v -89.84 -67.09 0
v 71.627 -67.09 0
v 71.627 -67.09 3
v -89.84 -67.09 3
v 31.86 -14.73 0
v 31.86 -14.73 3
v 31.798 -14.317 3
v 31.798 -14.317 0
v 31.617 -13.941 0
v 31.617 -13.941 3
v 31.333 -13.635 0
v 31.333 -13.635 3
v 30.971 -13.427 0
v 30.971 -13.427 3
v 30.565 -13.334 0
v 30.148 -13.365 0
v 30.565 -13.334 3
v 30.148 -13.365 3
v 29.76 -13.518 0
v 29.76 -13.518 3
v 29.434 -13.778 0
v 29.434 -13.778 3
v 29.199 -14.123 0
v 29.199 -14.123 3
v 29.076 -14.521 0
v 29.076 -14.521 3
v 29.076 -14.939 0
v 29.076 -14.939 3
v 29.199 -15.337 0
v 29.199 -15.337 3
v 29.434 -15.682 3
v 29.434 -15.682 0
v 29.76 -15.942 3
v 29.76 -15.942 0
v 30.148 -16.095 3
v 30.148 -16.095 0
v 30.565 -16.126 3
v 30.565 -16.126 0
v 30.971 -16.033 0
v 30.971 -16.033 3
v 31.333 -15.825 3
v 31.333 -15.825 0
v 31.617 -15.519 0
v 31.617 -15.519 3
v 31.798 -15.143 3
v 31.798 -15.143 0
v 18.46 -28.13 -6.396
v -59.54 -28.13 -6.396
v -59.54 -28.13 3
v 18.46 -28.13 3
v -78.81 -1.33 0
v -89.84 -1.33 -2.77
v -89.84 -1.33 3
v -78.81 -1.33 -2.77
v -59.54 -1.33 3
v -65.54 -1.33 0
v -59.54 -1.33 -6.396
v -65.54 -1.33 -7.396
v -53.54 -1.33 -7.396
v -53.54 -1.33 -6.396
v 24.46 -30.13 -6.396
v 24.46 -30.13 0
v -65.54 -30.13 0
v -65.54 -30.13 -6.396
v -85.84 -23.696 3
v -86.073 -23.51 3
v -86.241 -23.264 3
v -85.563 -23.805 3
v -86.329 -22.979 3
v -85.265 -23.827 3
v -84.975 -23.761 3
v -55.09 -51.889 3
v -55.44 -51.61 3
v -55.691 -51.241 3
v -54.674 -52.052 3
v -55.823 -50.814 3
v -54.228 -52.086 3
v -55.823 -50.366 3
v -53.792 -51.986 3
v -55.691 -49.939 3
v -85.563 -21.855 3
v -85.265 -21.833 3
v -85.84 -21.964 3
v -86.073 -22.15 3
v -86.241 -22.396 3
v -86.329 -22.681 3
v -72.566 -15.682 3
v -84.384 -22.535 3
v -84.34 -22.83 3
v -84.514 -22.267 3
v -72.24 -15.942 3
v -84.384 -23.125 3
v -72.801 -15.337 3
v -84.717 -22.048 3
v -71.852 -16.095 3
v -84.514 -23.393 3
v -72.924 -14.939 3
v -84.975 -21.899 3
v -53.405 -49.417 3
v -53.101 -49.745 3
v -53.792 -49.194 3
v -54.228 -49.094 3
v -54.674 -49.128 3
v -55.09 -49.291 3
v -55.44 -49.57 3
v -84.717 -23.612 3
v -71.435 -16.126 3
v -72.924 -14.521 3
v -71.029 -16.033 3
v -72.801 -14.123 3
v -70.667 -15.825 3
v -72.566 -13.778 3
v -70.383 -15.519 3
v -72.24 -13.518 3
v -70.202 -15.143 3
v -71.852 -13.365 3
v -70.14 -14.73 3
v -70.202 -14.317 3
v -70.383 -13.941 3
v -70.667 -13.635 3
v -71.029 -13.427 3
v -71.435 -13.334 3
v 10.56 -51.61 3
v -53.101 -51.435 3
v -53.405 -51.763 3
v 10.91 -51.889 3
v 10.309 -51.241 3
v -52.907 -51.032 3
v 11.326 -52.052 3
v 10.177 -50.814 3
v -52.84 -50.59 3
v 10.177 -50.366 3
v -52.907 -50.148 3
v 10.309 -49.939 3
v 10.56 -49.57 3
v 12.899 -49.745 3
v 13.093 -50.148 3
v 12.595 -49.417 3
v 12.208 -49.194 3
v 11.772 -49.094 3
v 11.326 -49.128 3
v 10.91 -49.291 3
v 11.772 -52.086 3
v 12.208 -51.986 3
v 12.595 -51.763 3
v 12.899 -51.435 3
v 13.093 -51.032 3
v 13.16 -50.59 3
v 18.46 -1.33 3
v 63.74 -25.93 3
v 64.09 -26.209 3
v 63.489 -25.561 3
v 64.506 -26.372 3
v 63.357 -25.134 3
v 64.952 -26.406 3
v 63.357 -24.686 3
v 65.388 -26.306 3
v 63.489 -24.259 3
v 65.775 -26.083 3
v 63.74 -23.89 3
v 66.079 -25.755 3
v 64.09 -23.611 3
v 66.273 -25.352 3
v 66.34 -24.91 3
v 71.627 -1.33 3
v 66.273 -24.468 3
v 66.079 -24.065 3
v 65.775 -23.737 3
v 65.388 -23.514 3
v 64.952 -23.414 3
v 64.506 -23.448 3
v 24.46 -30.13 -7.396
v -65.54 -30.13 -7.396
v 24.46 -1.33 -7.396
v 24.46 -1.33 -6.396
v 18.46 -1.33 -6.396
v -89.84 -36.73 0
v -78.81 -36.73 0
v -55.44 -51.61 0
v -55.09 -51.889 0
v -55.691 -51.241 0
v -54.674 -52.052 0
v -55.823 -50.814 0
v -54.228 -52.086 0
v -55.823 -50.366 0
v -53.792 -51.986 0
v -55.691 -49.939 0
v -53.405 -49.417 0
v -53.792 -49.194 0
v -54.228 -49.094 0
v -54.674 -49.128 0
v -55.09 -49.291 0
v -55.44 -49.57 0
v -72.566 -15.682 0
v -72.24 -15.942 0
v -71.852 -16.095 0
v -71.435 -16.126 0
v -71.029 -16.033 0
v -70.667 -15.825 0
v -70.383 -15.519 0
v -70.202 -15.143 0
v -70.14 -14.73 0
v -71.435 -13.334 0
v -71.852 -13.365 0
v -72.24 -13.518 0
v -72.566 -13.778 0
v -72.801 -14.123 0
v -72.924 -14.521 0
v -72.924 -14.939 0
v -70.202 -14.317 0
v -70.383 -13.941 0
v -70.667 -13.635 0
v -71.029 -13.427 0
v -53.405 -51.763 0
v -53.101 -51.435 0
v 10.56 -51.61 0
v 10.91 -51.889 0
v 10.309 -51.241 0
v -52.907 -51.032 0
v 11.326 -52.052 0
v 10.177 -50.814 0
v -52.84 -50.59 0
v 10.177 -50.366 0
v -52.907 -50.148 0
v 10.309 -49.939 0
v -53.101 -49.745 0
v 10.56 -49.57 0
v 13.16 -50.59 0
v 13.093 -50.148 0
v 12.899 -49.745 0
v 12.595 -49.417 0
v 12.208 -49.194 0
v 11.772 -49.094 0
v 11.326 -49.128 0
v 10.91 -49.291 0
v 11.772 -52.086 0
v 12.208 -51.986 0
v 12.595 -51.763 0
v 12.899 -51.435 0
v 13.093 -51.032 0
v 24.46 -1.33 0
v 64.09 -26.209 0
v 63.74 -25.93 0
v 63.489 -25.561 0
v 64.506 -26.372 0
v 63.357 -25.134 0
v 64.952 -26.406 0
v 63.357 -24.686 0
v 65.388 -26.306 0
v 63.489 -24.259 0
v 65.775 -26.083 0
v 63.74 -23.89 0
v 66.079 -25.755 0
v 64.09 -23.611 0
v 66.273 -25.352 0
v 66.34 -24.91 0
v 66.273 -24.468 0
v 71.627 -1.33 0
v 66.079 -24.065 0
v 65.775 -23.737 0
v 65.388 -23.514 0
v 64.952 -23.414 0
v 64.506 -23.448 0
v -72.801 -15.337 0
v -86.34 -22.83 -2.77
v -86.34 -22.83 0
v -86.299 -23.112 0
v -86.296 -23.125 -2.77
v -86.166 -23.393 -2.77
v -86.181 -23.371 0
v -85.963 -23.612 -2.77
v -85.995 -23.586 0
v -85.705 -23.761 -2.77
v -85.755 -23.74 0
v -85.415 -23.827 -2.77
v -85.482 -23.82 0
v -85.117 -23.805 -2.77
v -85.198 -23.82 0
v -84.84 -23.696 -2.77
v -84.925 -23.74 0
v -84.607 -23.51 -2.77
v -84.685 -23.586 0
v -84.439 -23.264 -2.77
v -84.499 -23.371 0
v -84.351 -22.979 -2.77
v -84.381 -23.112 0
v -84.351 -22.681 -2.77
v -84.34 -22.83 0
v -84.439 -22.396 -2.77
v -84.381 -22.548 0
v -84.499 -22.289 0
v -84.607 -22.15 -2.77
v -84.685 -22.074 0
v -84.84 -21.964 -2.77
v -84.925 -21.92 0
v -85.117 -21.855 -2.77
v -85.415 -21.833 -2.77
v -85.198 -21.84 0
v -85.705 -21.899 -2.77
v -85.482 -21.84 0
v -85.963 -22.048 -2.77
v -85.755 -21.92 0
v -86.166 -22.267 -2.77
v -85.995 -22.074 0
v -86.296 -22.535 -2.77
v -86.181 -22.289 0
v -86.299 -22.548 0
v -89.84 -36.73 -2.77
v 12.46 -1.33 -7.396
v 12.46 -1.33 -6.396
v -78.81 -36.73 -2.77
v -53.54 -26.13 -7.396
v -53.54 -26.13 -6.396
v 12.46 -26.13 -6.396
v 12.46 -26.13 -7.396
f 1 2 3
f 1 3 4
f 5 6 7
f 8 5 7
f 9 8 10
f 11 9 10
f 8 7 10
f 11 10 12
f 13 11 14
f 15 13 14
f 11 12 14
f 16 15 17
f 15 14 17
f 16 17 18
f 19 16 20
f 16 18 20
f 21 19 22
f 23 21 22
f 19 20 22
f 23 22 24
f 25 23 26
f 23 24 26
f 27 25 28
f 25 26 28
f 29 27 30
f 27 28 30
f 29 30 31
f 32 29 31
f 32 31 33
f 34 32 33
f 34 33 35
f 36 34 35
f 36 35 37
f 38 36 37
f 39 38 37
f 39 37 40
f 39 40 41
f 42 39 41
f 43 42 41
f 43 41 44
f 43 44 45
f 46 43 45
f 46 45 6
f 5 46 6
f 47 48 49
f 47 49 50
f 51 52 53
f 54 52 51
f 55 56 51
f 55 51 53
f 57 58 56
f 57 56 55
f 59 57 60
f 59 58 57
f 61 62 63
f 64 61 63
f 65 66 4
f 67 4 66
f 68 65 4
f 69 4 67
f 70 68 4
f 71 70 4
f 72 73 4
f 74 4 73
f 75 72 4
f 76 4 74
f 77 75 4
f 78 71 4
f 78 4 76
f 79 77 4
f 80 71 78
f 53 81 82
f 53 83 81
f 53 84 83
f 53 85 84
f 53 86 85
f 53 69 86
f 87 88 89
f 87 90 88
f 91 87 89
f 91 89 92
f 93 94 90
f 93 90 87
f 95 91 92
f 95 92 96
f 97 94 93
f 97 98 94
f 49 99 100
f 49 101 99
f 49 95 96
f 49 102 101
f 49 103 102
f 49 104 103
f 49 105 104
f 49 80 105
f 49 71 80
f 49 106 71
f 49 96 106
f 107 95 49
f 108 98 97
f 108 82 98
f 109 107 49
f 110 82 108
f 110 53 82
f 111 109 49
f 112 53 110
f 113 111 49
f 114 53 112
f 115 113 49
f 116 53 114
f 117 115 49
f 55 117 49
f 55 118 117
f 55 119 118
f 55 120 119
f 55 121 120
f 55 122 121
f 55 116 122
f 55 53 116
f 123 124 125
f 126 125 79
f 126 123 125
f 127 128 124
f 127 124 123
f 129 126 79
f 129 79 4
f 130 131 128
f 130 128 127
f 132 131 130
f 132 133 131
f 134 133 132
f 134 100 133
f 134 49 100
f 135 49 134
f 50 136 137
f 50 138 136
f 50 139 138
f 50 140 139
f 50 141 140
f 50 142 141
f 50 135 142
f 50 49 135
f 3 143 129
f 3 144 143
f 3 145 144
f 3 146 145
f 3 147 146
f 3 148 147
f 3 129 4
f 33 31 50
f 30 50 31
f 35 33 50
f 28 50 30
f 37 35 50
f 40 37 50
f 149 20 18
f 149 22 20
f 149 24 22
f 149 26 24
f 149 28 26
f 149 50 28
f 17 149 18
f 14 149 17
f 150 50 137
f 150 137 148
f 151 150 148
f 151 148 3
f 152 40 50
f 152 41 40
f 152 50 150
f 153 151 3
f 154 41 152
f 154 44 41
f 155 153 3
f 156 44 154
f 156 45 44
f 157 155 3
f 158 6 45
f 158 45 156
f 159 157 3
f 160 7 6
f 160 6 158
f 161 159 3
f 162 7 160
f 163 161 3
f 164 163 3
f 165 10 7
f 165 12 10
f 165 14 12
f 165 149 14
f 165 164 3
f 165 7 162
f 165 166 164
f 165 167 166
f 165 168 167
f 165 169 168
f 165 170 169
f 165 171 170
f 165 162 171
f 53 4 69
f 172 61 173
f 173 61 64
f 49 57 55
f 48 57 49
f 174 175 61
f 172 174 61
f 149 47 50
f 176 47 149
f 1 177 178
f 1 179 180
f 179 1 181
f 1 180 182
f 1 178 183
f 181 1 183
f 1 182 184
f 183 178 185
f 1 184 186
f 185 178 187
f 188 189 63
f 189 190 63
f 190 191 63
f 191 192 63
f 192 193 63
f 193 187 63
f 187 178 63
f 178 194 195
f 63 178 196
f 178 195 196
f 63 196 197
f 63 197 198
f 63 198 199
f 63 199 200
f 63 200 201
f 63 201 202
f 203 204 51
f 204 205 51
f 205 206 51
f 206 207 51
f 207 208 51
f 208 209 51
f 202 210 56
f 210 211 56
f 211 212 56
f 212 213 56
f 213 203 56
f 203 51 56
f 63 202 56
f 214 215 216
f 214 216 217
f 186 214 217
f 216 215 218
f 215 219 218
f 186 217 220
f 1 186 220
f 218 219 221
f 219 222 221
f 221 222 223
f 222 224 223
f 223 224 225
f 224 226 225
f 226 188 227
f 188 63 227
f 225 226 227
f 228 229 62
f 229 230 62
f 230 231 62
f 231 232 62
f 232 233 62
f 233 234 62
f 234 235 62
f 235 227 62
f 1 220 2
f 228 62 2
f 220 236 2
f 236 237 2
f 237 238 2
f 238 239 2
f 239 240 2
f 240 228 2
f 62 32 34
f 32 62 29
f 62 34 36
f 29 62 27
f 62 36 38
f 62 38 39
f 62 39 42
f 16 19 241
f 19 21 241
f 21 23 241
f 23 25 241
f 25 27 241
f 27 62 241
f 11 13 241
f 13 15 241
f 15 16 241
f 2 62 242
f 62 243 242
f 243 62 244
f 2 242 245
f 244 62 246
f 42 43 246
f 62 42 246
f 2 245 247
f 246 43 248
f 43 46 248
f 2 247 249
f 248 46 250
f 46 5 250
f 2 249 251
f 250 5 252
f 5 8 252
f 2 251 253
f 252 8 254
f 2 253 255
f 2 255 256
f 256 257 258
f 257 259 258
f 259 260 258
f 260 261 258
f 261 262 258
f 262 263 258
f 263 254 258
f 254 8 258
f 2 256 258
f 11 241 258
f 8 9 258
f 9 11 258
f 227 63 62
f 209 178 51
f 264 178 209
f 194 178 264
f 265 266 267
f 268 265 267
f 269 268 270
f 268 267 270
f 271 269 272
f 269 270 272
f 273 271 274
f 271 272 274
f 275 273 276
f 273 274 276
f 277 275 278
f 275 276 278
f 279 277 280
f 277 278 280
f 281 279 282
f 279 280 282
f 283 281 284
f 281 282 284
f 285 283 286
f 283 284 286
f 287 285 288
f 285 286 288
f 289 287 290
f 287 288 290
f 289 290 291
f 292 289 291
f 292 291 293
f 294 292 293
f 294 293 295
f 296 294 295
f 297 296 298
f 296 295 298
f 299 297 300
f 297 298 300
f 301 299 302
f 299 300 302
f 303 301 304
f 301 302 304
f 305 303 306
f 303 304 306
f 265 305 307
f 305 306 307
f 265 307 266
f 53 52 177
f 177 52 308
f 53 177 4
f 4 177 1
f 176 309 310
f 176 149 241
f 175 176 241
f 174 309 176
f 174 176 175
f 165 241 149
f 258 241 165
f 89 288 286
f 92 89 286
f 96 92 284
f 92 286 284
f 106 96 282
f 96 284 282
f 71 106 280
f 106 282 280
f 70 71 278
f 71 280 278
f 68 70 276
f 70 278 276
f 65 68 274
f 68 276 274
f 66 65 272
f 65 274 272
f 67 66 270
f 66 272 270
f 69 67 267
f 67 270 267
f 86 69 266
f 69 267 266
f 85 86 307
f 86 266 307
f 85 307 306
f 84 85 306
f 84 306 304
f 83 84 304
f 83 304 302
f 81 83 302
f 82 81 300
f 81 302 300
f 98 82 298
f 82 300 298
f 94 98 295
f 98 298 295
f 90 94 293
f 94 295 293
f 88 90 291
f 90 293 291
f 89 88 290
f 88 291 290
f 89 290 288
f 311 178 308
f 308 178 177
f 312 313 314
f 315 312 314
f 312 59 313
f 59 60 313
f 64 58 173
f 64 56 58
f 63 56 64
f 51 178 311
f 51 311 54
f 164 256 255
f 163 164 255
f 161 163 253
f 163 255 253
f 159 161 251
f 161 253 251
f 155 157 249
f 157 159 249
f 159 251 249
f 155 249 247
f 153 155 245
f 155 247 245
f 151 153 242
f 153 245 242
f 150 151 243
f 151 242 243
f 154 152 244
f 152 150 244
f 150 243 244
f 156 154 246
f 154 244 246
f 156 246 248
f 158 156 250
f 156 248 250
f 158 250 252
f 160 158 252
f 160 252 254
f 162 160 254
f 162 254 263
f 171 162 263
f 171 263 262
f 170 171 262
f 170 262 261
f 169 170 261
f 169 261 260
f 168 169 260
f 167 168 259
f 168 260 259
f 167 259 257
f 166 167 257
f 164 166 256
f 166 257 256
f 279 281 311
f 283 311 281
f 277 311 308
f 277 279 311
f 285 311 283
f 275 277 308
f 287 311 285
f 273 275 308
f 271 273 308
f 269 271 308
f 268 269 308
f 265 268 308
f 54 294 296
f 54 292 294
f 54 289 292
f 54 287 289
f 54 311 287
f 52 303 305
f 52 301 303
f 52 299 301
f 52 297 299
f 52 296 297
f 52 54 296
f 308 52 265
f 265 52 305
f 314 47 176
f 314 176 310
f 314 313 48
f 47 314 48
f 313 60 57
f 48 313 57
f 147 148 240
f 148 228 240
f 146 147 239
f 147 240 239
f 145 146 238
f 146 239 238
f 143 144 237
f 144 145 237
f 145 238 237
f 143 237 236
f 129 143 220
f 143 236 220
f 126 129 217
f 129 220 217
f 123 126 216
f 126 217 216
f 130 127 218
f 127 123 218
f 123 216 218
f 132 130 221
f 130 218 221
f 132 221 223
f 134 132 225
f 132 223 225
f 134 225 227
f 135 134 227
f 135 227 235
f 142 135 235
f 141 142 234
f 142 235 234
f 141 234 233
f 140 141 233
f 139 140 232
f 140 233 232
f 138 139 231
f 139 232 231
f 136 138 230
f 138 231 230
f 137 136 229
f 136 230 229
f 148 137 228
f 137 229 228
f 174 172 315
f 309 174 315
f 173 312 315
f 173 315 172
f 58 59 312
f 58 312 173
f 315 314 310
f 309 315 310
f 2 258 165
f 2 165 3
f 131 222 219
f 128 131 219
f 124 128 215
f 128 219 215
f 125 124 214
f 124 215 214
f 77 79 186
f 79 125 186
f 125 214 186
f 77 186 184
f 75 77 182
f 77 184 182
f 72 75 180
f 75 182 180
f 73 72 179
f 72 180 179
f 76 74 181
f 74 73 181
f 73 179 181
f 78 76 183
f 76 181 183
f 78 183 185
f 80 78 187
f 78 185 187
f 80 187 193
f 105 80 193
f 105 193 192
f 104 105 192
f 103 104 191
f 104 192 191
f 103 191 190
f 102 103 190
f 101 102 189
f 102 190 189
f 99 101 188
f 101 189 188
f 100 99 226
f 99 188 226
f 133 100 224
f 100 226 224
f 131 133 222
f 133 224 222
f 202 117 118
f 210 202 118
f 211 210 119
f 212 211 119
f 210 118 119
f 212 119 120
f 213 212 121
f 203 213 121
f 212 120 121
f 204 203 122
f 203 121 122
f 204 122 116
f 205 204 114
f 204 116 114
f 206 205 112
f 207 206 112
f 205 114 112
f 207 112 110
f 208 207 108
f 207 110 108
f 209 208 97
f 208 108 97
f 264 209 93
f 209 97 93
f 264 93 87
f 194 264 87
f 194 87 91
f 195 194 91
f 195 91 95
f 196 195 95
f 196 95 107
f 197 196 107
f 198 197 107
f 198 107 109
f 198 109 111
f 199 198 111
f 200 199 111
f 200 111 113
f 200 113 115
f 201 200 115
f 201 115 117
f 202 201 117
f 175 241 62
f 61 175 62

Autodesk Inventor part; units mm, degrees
ref_plane "YZ Plane" through (0, 0, 0) normal (1, 0, 0) x (0, 1, 0)
ref_plane "Arbeitsebene1" through (0, 0, 0) normal (0, 0, 1) x (1, 0, 0)
sketch "Skizze1" plane through (0, 0, 0) normal (0, 0, 1) x (1, 0, 0)
  circle A0 centre (-54.34, -50.59) radius 1.5 projected
  circle A1 centre (11.66, -50.59) radius 1.5 projected
  circle A2 centre (-85.34, -22.83) radius 1 projected
  circle A3 centre (-85.34, -22.83) radius 1 construction
  circle A4 centre (-85.34, 37.77) radius 1 construction
  line L0 (37.14, -42.13) -> (37.14, -36.73) construction
  arc A5 (32.14, -41.73) -> (37.14, -36.73) centre (32.14, -36.73) ccw construction
  line L1 (32.14, -41.73) -> (-73.22, -41.73) construction
  arc A6 (-78.22, -36.73) -> (-73.22, -41.73) centre (-73.22, -36.73) ccw construction
  line L2 (-78.22, -36.73) -> (-78.22, 48.27) construction
  arc A7 (-73.22, 53.27) -> (-78.22, 48.27) centre (-73.22, 48.27) ccw construction
  line L3 (-73.22, 53.27) -> (32.14, 53.27) construction
  arc A8 (37.14, 48.27) -> (32.14, 53.27) centre (32.14, 48.27) ccw construction
  line L4 (37.14, 48.27) -> (37.14, 54.21) construction
  line L5 (37.14, 54.21) -> (-89.84, 54.21) construction
  line L6 (-89.84, 54.21) -> (-89.84, -42.13) construction
  line L7 (-89.84, -42.13) -> (37.14, -42.13) construction
  circle A9 centre (64.84, -24.91) radius 1.5 construction
  circle A10 centre (-85.34, -43.41) radius 1 construction
  circle A11 centre (64.84, 35.59) radius 1.5 construction
  circle A12 centre (11.66, -50.59) radius 1.5 construction
  circle A13 centre (-54.34, -50.59) radius 1.5 construction
  circle A14 centre (-85.34, 58.59) radius 1 construction
  line L8 (-89.84, 67.09) -> (-89.84, 54.21) construction
  line L9 (-89.84, 54.21) -> (37.14, 54.21) construction
  line L10 (37.14, 54.21) -> (37.14, -42.13) construction
  line L11 (37.14, -42.13) -> (-89.84, -42.13) construction
  line L12 (-89.84, -42.13) -> (-89.84, -67.09) construction
  line L13 (-89.84, -67.09) -> (89.84, -67.09) construction
  line L14 (89.84, -67.09) -> (89.84, 67.09) construction
  line L15 (89.84, 67.09) -> (-89.84, 67.09) construction
  line L16 (-58.54, -1.33) -> (17.46, -1.33) construction
  line L17 (-58.54, -27.13) -> (-58.54, -1.33) construction
  line L18 (17.46, -27.13) -> (-58.54, -27.13) construction
  line L19 (17.46, -1.33) -> (17.46, -27.13) construction
  line L20 (-89.84, -1.33) -> (-59.54, -1.33)
  line L21 (-59.54, -1.33) -> (-59.54, -28.13)
  line L22 (-59.54, -28.13) -> (18.46, -28.13)
  line L23 (18.46, -28.13) -> (18.46, -1.33)
  line L24 (18.46, -1.33) -> (71.6268, -1.33)
  line L25 (71.6268, -1.33) -> (71.6268, -67.09)
  line L26 (71.6268, -67.09) -> (-89.84, -67.09)
  line L27 (-89.84, -1.33) -> (-89.84, -67.09)
  circle A15 centre (-54.34, -50.59) radius 1.5
  circle A16 centre (11.66, -50.59) radius 1.5
  circle A17 centre (-85.34, -22.83) radius 1
  circle A18 centre (64.84, -24.91) radius 1.5
  point P0 (0, 0)
  dimension "d0" = 1
  dimension "d1" = 1
  dimension "d2" = 1
extrude "Extrusion1" add sketch "Skizze1" along normal blind 3
sketch "Skizze2" plane through (0, 0, 0) normal (0, 0, -1) x (-1, 0, 0)
  circle A0 centre (85.34, -22.83) radius 1 projected
  circle A1 centre (85.34, 37.77) radius 1 projected
  line L0 (-37.14, -42.13) -> (-37.14, -36.73) projected
  arc A2 (-37.14, -36.73) -> (-32.14, -41.73) centre (-32.14, -36.73) ccw projected
  line L1 (-32.14, -41.73) -> (73.22, -41.73) projected
  arc A3 (73.22, -41.73) -> (78.22, -36.73) centre (73.22, -36.73) ccw projected
  line L2 (78.22, -36.73) -> (78.22, 48.27) projected
  arc A4 (78.22, 48.27) -> (73.22, 53.27) centre (73.22, 48.27) ccw projected
  line L3 (73.22, 53.27) -> (-32.14, 53.27) projected
  arc A5 (-32.14, 53.27) -> (-37.14, 48.27) centre (-32.14, 48.27) ccw projected
  line L4 (-37.14, 48.27) -> (-37.14, 54.21) projected
  line L5 (-37.14, 54.21) -> (89.84, 54.21) projected
  line L6 (89.84, 54.21) -> (89.84, -42.13) projected
  line L7 (89.84, -42.13) -> (-37.14, -42.13) projected
  line L8 (78.22, -36.73) -> (89.84, -36.73)
  line L9 (89.84, -1.33) -> (89.84, -67.09) projected
  line L10 (59.54, -1.33) -> (89.84, -1.33) projected
  line L11 (89.84, -36.73) -> (78.8105, -36.73)
  line L12 (78.8105, -36.73) -> (78.8105, -1.33)
  line L13 (78.8105, -1.33) -> (89.84, -1.33)
  line L14 (89.84, -1.33) -> (89.84, -36.73)
  point P0 (0, 0)
ref_plane "Arbeitsebene2" through (-89.84, -42.13, -2.77) normal (0, 0, 1) x (1, 0, 0)
extrude "Extrusion2" add sketch "Skizze2" along normal up to surface (2.77 mm away) contours L8 L12 L10 L6
ref_plane "Arbeitsebene3" through (-58.54, -27.13, -6.3955) normal (0, 0, -1) x (0, 1, 0)
sketch "Skizze3" plane through (0, 0, 0) normal (0, 0, -1) x (-1, 0, 0)
  line L0 (78.8105, -36.73) -> (78.8105, -1.33) projected
  line L1 (59.54, -1.33) -> (78.8105, -1.33) projected
  line L2 (59.54, -28.13) -> (59.54, -1.33) projected
  line L3 (-18.46, -28.13) -> (59.54, -28.13) projected
  line L4 (-18.46, -1.33) -> (-18.46, -28.13) projected
  line L5 (-71.6268, -1.33) -> (-18.46, -1.33) projected
  line L6 (-71.6268, -67.09) -> (-71.6268, -1.33) projected
  line L7 (89.84, -67.09) -> (-71.6268, -67.09) projected
  line L8 (89.84, -36.73) -> (89.84, -67.09) projected
  line L9 (89.84, -36.73) -> (78.8105, -36.73) projected
  circle A0 centre (-64.84, -24.91) radius 1.5 projected
  circle A1 centre (-11.66, -50.59) radius 1.5 projected
  circle A2 centre (54.34, -50.59) radius 1.5 projected
  line L10 (-18.46, -1.33) -> (-18.46, -28.13) projected
  line L11 (-18.46, -1.33) -> (-24.46, -1.33)
  line L12 (-24.46, -1.33) -> (-24.46, -28.13)
  line L13 (-24.46, -28.13) -> (-18.46, -28.13)
  line L14 (-18.46, -28.13) -> (-18.46, -1.33)
  line L15 (59.54, -1.33) -> (65.54, -1.33)
  line L16 (65.54, -1.33) -> (65.54, -28.13)
  line L17 (65.54, -28.13) -> (59.54, -28.13)
  line L18 (59.54, -28.13) -> (59.54, -1.33)
  line L19 (65.54, -28.13) -> (-24.46, -28.13)
  line L20 (-24.46, -28.13) -> (-24.46, -30.13)
  line L21 (-24.46, -30.13) -> (65.54, -30.13)
  line L22 (65.54, -30.13) -> (65.54, -28.13)
  point P0 (0, 0)
  dimension "d7" = 6
  dimension "d8" = 6
  dimension "d9" = 2
extrude "Extrusion3" add sketch "Skizze3" along normal up to surface (6.3955 mm away) contours L16 L17 L2 L1 | L22 L21 L20 L13 L3 L17 | L13 L12 L5 L4
sketch "Skizze4" plane through (0, 0, -6.3955) normal (0, 0, -1) x (-1, 0, 0)
  line L0 (-18.46, -1.33) -> (-24.46, -1.33) projected
  line L1 (-24.46, -1.33) -> (-24.46, -30.13) projected
  line L2 (-24.46, -30.13) -> (65.54, -30.13) projected
  line L3 (65.54, -30.13) -> (65.54, -1.33) projected
  line L4 (65.54, -1.33) -> (59.54, -1.33) projected
  line L5 (59.54, -1.33) -> (59.54, -28.13) projected
  line L6 (59.54, -28.13) -> (-18.46, -28.13) projected
  line L7 (-18.46, -28.13) -> (-18.46, -1.33) projected
  line L8 (59.54, -1.33) -> (53.54, -1.33)
  line L9 (53.54, -1.33) -> (53.54, -28.13)
  line L10 (53.54, -28.13) -> (59.54, -28.13)
  line L11 (59.54, -28.13) -> (59.54, -1.33)
  line L12 (-18.46, -28.13) -> (59.54, -28.13) projected
  line L13 (-18.46, -28.13) -> (-12.46, -28.13)
  line L14 (-12.46, -28.13) -> (-12.46, -1.33)
  line L15 (-12.46, -1.33) -> (-18.46, -1.33)
  line L16 (-18.46, -1.33) -> (-18.46, -28.13)
  line L17 (-12.46, -28.13) -> (53.54, -28.13)
  line L18 (53.54, -28.13) -> (53.54, -26.13)
  line L19 (53.54, -26.13) -> (-12.46, -26.13)
  line L20 (-12.46, -26.13) -> (-12.46, -28.13)
  point P0 (0, 0)
  point P1 (-12.46, -26.13)
  dimension "d12" = 6
  dimension "d13" = 6
  dimension "d14" = 2
extrude "Extrusion4" add sketch "Skizze4" along normal blind 1
sketch "Skizze5" plane through (0, 0, 3) normal (0, 0, 1) x (1, 0, 0)
  line L0 (-89.84, -67.09) -> (71.6268, -67.09) projected
  line L1 (71.6268, -67.09) -> (71.6268, -1.33) projected
  line L2 (71.6268, -1.33) -> (18.46, -1.33) projected
  line L3 (18.46, -1.33) -> (18.46, -28.13) projected
  line L4 (18.46, -28.13) -> (-59.54, -28.13) projected
  line L5 (-59.54, -28.13) -> (-59.54, -1.33) projected
  line L6 (-59.54, -1.33) -> (-89.84, -1.33) projected
  line L7 (-89.84, -1.33) -> (-89.84, -67.09) projected
  circle A0 centre (64.84, -24.91) radius 1.5 projected
  circle A1 centre (-85.34, -22.83) radius 1 projected
  circle A2 centre (11.66, -50.59) radius 1.5 projected
  circle A3 centre (-54.34, -50.59) radius 1.5 projected
  circle A4 centre (-71.54, -14.73) radius 1.4
  circle A5 centre (30.46, -14.73) radius 1.4
  point P0 (0, 0)
  dimension "d18" = 2.8
  dimension "d19" = 2.8
  dimension "d20" = 12
  dimension "d21" = 12
extrude "Extrusion5" cut sketch "Skizze5" against normal through all contours A4 | A5
properties part number "30_XYTabel_Aliexpress_cellSTORM_chiptray"
